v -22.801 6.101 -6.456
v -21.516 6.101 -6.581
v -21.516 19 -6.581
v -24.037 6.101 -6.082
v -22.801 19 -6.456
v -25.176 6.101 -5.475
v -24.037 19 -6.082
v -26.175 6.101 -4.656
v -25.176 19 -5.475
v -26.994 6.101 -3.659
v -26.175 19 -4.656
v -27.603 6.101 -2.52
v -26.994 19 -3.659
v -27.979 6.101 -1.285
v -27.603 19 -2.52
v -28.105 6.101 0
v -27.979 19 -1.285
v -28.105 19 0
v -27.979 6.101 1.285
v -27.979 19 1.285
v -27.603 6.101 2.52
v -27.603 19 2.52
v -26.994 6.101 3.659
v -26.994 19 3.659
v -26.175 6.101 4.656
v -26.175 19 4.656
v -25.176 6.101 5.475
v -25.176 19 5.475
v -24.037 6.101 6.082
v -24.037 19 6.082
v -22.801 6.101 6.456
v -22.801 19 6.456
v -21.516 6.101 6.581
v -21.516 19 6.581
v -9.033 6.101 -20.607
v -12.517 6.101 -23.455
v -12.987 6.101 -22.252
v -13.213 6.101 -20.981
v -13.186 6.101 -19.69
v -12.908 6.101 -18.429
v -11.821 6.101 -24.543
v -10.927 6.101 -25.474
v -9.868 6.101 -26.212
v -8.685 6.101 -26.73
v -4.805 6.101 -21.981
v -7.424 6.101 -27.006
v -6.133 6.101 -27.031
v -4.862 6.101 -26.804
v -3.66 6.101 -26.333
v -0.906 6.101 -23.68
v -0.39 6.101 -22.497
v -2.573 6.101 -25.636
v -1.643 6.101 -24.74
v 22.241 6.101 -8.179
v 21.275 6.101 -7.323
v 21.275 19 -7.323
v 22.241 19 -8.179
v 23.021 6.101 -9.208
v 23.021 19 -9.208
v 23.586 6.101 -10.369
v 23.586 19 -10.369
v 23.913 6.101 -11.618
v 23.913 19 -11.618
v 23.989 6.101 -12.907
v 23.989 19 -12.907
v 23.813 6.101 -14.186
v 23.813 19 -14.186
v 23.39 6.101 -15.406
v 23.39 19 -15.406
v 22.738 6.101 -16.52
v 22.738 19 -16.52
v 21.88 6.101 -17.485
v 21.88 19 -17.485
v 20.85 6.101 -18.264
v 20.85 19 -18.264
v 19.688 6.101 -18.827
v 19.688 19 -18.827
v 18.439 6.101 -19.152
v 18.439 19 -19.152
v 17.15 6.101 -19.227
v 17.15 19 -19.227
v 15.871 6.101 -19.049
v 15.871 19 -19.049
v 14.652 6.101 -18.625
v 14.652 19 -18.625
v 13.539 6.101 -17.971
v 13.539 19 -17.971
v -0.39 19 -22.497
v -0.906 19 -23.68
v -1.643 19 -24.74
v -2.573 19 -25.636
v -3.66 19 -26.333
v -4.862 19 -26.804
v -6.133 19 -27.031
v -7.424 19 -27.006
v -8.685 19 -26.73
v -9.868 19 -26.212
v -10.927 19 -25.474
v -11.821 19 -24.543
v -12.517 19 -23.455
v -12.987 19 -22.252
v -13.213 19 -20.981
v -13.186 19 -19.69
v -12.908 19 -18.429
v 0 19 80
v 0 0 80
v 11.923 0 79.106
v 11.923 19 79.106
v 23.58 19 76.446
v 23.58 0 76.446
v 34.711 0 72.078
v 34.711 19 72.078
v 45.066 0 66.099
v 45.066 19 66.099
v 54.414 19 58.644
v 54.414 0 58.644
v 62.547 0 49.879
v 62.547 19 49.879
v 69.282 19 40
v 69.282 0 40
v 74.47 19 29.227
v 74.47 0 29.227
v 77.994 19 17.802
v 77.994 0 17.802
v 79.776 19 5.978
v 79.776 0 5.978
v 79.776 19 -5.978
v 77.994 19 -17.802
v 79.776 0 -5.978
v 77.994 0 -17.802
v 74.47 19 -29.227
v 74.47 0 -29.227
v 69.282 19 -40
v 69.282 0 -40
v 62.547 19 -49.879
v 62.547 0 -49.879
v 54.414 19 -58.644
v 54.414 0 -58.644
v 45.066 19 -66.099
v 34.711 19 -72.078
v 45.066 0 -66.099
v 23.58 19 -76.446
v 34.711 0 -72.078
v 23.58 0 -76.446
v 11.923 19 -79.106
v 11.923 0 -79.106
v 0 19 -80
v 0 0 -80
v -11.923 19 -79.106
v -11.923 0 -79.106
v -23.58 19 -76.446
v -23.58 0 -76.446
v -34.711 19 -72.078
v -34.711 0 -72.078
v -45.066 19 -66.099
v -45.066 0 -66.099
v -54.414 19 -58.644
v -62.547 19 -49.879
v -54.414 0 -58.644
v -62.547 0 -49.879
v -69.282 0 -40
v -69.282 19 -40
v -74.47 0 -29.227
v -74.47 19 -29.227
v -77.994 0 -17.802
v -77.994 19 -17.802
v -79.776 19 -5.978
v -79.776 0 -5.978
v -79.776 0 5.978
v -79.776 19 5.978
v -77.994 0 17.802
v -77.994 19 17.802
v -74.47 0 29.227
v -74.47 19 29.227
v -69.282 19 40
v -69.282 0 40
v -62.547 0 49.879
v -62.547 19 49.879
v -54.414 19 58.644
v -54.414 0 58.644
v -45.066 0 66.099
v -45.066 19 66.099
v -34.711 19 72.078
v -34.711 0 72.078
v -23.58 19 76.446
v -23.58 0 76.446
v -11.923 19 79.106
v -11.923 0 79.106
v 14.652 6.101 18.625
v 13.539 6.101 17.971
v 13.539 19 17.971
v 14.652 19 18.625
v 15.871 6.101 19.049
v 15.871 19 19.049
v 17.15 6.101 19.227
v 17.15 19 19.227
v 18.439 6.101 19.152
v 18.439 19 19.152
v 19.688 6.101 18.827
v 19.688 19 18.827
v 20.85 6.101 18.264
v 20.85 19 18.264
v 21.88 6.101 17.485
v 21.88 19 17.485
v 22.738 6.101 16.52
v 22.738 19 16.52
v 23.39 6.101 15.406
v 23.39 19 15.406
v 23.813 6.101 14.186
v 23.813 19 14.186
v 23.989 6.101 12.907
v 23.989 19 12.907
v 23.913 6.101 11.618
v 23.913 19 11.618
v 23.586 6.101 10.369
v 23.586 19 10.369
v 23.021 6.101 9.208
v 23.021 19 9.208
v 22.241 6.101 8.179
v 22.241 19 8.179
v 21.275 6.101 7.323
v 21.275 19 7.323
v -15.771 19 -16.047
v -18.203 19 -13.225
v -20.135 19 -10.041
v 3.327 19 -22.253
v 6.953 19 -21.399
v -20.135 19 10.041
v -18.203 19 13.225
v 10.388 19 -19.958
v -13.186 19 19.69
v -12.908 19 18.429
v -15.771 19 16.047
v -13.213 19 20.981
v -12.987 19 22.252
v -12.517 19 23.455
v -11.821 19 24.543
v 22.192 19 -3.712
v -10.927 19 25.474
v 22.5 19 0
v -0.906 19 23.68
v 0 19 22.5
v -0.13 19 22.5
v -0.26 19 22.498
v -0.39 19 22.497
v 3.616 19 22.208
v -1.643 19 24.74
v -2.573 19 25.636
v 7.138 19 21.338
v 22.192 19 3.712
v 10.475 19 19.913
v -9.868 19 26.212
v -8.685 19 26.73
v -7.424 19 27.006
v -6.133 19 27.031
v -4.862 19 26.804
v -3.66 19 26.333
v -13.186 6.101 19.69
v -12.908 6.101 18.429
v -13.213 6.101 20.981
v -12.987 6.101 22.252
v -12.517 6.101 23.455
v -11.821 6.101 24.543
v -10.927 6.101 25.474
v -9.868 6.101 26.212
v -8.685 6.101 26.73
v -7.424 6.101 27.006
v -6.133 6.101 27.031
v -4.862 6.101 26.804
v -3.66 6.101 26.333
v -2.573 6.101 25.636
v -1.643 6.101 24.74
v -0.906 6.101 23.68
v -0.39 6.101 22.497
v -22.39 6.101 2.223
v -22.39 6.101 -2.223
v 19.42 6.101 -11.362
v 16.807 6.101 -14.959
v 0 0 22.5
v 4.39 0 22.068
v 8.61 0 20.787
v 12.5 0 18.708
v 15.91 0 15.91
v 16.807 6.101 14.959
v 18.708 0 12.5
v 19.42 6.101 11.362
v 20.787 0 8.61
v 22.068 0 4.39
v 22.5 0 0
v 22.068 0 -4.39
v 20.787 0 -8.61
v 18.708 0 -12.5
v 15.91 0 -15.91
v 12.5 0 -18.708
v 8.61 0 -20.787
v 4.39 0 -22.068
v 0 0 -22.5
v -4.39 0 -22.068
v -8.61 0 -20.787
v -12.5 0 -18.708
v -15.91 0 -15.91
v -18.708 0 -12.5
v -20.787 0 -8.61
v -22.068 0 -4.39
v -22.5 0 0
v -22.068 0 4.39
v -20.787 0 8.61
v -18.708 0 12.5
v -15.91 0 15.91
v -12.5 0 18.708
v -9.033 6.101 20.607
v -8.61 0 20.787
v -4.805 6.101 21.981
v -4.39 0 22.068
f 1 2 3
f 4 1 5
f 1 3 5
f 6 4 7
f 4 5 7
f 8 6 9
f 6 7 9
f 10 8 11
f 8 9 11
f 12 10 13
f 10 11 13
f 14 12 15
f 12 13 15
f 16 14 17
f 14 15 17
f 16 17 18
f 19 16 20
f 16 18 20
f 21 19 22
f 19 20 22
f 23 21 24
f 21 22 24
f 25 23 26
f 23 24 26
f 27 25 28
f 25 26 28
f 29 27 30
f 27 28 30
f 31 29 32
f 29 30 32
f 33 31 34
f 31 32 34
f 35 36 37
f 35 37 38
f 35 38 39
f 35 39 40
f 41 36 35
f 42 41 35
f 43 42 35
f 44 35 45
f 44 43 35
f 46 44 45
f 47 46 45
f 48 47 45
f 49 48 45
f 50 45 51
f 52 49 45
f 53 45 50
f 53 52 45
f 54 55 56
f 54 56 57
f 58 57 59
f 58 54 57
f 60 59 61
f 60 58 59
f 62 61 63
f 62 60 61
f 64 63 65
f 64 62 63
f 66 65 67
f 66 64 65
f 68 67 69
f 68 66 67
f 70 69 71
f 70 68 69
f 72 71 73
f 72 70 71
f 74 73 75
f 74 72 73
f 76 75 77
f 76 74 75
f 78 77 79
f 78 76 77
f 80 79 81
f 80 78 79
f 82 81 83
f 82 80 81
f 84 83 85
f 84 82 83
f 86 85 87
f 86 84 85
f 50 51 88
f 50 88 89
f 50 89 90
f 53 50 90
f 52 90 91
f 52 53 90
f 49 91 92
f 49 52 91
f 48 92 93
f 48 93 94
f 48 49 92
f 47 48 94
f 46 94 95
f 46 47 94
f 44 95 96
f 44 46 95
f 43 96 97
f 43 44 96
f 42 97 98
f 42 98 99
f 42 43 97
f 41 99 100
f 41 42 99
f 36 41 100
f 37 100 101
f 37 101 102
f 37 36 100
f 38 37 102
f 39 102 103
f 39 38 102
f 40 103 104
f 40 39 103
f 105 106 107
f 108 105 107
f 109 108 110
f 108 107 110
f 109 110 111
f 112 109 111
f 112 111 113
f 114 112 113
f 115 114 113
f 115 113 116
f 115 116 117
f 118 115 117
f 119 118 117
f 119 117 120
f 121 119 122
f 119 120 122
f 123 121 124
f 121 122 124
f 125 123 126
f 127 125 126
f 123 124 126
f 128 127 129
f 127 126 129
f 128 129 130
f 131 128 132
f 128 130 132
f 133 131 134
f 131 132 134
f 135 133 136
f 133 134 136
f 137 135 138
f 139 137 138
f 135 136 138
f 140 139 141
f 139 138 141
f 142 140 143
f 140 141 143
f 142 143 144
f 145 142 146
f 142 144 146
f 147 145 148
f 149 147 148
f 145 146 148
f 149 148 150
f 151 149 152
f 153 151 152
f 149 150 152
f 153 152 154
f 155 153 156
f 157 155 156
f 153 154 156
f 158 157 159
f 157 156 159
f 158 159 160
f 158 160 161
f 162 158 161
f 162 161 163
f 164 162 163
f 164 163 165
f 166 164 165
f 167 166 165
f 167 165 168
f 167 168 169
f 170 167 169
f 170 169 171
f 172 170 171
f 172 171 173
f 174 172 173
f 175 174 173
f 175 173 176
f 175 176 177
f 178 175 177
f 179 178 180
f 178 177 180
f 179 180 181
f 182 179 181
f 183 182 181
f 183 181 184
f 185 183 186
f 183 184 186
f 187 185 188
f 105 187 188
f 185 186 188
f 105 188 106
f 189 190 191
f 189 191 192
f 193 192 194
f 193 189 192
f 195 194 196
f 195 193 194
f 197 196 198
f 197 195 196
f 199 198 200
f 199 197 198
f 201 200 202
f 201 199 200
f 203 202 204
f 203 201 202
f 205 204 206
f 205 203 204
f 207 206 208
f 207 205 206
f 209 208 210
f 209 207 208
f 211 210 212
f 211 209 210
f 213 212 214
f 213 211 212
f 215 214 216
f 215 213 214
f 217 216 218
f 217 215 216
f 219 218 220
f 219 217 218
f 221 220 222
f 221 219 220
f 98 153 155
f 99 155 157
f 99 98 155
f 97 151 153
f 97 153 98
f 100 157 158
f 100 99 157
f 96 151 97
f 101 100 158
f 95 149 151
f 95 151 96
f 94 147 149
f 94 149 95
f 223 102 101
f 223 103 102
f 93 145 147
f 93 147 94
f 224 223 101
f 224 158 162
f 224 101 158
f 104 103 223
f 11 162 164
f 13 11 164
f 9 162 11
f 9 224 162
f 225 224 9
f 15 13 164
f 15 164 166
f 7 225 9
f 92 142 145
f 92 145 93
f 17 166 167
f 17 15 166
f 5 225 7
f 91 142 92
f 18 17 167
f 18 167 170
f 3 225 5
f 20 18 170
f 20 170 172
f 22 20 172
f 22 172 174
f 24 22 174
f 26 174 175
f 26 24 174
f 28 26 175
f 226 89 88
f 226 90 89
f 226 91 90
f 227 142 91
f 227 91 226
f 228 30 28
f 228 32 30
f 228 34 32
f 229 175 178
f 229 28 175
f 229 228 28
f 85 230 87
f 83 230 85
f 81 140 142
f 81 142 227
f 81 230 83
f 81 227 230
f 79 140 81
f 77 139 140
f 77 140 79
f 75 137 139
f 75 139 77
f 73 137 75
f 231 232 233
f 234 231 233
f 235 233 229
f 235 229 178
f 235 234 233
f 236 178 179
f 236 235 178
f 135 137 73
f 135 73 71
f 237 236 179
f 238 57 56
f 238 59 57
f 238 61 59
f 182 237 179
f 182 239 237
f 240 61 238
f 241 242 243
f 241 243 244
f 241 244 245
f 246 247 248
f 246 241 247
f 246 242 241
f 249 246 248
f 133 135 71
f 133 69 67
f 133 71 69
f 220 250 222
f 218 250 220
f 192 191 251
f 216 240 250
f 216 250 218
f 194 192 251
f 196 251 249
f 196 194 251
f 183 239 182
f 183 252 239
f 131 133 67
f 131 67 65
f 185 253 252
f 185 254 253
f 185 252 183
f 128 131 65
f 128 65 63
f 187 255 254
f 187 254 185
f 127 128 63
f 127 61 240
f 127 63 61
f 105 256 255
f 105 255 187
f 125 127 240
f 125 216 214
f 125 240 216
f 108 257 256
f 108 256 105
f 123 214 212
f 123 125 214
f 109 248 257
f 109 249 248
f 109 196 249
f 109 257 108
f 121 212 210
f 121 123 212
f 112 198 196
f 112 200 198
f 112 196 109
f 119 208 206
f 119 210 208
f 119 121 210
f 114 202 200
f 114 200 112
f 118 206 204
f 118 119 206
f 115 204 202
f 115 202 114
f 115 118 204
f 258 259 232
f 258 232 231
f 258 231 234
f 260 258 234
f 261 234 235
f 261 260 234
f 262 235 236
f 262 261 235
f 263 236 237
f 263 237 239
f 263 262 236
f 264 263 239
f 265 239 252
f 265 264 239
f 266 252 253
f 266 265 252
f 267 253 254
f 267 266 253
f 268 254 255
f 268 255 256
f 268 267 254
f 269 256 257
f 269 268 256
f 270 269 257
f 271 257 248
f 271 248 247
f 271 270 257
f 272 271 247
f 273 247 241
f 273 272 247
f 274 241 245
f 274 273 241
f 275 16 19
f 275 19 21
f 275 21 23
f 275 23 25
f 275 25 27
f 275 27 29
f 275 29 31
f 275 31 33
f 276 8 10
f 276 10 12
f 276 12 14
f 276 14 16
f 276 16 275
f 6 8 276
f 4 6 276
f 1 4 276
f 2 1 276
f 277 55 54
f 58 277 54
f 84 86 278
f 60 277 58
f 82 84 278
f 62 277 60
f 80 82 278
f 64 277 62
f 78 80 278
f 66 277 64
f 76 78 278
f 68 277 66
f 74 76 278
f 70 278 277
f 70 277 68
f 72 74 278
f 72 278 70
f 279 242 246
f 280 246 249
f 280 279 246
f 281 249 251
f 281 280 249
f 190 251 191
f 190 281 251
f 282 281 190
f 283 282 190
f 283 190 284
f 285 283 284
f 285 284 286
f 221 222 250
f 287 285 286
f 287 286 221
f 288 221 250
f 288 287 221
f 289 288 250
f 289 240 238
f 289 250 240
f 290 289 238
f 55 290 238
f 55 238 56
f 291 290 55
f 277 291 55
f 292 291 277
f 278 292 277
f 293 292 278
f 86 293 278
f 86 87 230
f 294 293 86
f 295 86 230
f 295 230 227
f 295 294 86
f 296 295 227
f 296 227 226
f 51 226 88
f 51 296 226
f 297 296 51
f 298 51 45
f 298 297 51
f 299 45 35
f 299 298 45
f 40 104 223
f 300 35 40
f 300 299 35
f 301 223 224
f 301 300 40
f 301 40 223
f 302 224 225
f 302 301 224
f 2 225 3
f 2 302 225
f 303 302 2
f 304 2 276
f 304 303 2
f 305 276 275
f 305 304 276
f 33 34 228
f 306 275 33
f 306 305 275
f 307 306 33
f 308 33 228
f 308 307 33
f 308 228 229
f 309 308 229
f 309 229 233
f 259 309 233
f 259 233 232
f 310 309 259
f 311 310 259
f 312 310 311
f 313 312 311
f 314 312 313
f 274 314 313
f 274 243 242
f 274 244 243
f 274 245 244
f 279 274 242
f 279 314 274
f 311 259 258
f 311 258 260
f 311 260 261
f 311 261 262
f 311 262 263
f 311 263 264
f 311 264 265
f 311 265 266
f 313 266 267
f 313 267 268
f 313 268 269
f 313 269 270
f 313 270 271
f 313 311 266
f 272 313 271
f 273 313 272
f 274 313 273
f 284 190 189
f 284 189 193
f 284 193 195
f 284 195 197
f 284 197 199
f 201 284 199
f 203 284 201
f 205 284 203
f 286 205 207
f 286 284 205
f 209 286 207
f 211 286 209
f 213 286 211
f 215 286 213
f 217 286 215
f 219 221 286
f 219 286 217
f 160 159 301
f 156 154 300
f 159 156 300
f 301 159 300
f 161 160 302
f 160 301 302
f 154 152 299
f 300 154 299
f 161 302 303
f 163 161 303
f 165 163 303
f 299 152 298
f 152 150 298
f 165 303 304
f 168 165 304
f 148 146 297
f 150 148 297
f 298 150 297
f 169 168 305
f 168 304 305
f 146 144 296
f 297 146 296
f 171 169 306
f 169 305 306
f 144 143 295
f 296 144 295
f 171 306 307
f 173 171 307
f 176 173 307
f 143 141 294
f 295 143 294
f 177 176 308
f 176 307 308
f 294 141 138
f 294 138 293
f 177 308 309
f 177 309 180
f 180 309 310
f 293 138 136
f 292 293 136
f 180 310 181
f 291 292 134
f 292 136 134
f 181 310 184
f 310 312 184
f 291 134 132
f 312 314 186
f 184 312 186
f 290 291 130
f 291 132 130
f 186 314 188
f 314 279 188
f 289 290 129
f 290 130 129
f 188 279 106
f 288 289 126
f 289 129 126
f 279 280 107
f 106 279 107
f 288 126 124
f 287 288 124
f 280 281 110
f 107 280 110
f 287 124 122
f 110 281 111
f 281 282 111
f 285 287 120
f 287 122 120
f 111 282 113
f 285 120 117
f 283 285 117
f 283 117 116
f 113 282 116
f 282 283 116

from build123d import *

# Parameters (mm, degrees)
SKETCH1_R           = 80
BOSS_EXTRUDE1_DEPTH = 19
SKETCH2_R           = 22.5
CUT_EXTRUDE1_DEPTH  = 115.721401665
SKETCH3_R           = 6.580979797
CUT_EXTRUDE2_DEPTH  = 12.899257244
CIRPATTERN1_COUNT   = 5


with BuildPart() as part:
    # Sketch1 → Boss-Extrude1 (new body)
    with BuildSketch(Plane(origin=(0, 0, 0), x_dir=(1, 0, 0), z_dir=(0, 1, 0))):
        Circle(SKETCH1_R)
    extrude(amount=BOSS_EXTRUDE1_DEPTH)

    # Sketch2 → Cut-Extrude1 (cut, through all)
    with BuildSketch(Plane(origin=(0, 0, 0), x_dir=(1, 0, 0), z_dir=(0, 1, 0))):
        Circle(SKETCH2_R)
    extrude(amount=CUT_EXTRUDE1_DEPTH, mode=Mode.SUBTRACT)

    # Sketch3 → Cut-Extrude2 (cut)
    with BuildSketch(Plane(origin=(0, 19, 0), x_dir=(1, 0, 0), z_dir=(0, 1, 0))):
        with Locations((-21.524179489, 0)):
            Circle(SKETCH3_R)
    cut_extrude2 = extrude(amount=-CUT_EXTRUDE2_DEPTH, mode=Mode.SUBTRACT)

    # CirPattern1: Cut-Extrude2 ×5 about axis
    cirpattern1_axis = Axis((0, 0, 0), (0, 1, 0))
    for i in range(1, CIRPATTERN1_COUNT):
        add(cut_extrude2.rotate(cirpattern1_axis, i * 360 / CIRPATTERN1_COUNT), mode=Mode.SUBTRACT)


solid = part.part
